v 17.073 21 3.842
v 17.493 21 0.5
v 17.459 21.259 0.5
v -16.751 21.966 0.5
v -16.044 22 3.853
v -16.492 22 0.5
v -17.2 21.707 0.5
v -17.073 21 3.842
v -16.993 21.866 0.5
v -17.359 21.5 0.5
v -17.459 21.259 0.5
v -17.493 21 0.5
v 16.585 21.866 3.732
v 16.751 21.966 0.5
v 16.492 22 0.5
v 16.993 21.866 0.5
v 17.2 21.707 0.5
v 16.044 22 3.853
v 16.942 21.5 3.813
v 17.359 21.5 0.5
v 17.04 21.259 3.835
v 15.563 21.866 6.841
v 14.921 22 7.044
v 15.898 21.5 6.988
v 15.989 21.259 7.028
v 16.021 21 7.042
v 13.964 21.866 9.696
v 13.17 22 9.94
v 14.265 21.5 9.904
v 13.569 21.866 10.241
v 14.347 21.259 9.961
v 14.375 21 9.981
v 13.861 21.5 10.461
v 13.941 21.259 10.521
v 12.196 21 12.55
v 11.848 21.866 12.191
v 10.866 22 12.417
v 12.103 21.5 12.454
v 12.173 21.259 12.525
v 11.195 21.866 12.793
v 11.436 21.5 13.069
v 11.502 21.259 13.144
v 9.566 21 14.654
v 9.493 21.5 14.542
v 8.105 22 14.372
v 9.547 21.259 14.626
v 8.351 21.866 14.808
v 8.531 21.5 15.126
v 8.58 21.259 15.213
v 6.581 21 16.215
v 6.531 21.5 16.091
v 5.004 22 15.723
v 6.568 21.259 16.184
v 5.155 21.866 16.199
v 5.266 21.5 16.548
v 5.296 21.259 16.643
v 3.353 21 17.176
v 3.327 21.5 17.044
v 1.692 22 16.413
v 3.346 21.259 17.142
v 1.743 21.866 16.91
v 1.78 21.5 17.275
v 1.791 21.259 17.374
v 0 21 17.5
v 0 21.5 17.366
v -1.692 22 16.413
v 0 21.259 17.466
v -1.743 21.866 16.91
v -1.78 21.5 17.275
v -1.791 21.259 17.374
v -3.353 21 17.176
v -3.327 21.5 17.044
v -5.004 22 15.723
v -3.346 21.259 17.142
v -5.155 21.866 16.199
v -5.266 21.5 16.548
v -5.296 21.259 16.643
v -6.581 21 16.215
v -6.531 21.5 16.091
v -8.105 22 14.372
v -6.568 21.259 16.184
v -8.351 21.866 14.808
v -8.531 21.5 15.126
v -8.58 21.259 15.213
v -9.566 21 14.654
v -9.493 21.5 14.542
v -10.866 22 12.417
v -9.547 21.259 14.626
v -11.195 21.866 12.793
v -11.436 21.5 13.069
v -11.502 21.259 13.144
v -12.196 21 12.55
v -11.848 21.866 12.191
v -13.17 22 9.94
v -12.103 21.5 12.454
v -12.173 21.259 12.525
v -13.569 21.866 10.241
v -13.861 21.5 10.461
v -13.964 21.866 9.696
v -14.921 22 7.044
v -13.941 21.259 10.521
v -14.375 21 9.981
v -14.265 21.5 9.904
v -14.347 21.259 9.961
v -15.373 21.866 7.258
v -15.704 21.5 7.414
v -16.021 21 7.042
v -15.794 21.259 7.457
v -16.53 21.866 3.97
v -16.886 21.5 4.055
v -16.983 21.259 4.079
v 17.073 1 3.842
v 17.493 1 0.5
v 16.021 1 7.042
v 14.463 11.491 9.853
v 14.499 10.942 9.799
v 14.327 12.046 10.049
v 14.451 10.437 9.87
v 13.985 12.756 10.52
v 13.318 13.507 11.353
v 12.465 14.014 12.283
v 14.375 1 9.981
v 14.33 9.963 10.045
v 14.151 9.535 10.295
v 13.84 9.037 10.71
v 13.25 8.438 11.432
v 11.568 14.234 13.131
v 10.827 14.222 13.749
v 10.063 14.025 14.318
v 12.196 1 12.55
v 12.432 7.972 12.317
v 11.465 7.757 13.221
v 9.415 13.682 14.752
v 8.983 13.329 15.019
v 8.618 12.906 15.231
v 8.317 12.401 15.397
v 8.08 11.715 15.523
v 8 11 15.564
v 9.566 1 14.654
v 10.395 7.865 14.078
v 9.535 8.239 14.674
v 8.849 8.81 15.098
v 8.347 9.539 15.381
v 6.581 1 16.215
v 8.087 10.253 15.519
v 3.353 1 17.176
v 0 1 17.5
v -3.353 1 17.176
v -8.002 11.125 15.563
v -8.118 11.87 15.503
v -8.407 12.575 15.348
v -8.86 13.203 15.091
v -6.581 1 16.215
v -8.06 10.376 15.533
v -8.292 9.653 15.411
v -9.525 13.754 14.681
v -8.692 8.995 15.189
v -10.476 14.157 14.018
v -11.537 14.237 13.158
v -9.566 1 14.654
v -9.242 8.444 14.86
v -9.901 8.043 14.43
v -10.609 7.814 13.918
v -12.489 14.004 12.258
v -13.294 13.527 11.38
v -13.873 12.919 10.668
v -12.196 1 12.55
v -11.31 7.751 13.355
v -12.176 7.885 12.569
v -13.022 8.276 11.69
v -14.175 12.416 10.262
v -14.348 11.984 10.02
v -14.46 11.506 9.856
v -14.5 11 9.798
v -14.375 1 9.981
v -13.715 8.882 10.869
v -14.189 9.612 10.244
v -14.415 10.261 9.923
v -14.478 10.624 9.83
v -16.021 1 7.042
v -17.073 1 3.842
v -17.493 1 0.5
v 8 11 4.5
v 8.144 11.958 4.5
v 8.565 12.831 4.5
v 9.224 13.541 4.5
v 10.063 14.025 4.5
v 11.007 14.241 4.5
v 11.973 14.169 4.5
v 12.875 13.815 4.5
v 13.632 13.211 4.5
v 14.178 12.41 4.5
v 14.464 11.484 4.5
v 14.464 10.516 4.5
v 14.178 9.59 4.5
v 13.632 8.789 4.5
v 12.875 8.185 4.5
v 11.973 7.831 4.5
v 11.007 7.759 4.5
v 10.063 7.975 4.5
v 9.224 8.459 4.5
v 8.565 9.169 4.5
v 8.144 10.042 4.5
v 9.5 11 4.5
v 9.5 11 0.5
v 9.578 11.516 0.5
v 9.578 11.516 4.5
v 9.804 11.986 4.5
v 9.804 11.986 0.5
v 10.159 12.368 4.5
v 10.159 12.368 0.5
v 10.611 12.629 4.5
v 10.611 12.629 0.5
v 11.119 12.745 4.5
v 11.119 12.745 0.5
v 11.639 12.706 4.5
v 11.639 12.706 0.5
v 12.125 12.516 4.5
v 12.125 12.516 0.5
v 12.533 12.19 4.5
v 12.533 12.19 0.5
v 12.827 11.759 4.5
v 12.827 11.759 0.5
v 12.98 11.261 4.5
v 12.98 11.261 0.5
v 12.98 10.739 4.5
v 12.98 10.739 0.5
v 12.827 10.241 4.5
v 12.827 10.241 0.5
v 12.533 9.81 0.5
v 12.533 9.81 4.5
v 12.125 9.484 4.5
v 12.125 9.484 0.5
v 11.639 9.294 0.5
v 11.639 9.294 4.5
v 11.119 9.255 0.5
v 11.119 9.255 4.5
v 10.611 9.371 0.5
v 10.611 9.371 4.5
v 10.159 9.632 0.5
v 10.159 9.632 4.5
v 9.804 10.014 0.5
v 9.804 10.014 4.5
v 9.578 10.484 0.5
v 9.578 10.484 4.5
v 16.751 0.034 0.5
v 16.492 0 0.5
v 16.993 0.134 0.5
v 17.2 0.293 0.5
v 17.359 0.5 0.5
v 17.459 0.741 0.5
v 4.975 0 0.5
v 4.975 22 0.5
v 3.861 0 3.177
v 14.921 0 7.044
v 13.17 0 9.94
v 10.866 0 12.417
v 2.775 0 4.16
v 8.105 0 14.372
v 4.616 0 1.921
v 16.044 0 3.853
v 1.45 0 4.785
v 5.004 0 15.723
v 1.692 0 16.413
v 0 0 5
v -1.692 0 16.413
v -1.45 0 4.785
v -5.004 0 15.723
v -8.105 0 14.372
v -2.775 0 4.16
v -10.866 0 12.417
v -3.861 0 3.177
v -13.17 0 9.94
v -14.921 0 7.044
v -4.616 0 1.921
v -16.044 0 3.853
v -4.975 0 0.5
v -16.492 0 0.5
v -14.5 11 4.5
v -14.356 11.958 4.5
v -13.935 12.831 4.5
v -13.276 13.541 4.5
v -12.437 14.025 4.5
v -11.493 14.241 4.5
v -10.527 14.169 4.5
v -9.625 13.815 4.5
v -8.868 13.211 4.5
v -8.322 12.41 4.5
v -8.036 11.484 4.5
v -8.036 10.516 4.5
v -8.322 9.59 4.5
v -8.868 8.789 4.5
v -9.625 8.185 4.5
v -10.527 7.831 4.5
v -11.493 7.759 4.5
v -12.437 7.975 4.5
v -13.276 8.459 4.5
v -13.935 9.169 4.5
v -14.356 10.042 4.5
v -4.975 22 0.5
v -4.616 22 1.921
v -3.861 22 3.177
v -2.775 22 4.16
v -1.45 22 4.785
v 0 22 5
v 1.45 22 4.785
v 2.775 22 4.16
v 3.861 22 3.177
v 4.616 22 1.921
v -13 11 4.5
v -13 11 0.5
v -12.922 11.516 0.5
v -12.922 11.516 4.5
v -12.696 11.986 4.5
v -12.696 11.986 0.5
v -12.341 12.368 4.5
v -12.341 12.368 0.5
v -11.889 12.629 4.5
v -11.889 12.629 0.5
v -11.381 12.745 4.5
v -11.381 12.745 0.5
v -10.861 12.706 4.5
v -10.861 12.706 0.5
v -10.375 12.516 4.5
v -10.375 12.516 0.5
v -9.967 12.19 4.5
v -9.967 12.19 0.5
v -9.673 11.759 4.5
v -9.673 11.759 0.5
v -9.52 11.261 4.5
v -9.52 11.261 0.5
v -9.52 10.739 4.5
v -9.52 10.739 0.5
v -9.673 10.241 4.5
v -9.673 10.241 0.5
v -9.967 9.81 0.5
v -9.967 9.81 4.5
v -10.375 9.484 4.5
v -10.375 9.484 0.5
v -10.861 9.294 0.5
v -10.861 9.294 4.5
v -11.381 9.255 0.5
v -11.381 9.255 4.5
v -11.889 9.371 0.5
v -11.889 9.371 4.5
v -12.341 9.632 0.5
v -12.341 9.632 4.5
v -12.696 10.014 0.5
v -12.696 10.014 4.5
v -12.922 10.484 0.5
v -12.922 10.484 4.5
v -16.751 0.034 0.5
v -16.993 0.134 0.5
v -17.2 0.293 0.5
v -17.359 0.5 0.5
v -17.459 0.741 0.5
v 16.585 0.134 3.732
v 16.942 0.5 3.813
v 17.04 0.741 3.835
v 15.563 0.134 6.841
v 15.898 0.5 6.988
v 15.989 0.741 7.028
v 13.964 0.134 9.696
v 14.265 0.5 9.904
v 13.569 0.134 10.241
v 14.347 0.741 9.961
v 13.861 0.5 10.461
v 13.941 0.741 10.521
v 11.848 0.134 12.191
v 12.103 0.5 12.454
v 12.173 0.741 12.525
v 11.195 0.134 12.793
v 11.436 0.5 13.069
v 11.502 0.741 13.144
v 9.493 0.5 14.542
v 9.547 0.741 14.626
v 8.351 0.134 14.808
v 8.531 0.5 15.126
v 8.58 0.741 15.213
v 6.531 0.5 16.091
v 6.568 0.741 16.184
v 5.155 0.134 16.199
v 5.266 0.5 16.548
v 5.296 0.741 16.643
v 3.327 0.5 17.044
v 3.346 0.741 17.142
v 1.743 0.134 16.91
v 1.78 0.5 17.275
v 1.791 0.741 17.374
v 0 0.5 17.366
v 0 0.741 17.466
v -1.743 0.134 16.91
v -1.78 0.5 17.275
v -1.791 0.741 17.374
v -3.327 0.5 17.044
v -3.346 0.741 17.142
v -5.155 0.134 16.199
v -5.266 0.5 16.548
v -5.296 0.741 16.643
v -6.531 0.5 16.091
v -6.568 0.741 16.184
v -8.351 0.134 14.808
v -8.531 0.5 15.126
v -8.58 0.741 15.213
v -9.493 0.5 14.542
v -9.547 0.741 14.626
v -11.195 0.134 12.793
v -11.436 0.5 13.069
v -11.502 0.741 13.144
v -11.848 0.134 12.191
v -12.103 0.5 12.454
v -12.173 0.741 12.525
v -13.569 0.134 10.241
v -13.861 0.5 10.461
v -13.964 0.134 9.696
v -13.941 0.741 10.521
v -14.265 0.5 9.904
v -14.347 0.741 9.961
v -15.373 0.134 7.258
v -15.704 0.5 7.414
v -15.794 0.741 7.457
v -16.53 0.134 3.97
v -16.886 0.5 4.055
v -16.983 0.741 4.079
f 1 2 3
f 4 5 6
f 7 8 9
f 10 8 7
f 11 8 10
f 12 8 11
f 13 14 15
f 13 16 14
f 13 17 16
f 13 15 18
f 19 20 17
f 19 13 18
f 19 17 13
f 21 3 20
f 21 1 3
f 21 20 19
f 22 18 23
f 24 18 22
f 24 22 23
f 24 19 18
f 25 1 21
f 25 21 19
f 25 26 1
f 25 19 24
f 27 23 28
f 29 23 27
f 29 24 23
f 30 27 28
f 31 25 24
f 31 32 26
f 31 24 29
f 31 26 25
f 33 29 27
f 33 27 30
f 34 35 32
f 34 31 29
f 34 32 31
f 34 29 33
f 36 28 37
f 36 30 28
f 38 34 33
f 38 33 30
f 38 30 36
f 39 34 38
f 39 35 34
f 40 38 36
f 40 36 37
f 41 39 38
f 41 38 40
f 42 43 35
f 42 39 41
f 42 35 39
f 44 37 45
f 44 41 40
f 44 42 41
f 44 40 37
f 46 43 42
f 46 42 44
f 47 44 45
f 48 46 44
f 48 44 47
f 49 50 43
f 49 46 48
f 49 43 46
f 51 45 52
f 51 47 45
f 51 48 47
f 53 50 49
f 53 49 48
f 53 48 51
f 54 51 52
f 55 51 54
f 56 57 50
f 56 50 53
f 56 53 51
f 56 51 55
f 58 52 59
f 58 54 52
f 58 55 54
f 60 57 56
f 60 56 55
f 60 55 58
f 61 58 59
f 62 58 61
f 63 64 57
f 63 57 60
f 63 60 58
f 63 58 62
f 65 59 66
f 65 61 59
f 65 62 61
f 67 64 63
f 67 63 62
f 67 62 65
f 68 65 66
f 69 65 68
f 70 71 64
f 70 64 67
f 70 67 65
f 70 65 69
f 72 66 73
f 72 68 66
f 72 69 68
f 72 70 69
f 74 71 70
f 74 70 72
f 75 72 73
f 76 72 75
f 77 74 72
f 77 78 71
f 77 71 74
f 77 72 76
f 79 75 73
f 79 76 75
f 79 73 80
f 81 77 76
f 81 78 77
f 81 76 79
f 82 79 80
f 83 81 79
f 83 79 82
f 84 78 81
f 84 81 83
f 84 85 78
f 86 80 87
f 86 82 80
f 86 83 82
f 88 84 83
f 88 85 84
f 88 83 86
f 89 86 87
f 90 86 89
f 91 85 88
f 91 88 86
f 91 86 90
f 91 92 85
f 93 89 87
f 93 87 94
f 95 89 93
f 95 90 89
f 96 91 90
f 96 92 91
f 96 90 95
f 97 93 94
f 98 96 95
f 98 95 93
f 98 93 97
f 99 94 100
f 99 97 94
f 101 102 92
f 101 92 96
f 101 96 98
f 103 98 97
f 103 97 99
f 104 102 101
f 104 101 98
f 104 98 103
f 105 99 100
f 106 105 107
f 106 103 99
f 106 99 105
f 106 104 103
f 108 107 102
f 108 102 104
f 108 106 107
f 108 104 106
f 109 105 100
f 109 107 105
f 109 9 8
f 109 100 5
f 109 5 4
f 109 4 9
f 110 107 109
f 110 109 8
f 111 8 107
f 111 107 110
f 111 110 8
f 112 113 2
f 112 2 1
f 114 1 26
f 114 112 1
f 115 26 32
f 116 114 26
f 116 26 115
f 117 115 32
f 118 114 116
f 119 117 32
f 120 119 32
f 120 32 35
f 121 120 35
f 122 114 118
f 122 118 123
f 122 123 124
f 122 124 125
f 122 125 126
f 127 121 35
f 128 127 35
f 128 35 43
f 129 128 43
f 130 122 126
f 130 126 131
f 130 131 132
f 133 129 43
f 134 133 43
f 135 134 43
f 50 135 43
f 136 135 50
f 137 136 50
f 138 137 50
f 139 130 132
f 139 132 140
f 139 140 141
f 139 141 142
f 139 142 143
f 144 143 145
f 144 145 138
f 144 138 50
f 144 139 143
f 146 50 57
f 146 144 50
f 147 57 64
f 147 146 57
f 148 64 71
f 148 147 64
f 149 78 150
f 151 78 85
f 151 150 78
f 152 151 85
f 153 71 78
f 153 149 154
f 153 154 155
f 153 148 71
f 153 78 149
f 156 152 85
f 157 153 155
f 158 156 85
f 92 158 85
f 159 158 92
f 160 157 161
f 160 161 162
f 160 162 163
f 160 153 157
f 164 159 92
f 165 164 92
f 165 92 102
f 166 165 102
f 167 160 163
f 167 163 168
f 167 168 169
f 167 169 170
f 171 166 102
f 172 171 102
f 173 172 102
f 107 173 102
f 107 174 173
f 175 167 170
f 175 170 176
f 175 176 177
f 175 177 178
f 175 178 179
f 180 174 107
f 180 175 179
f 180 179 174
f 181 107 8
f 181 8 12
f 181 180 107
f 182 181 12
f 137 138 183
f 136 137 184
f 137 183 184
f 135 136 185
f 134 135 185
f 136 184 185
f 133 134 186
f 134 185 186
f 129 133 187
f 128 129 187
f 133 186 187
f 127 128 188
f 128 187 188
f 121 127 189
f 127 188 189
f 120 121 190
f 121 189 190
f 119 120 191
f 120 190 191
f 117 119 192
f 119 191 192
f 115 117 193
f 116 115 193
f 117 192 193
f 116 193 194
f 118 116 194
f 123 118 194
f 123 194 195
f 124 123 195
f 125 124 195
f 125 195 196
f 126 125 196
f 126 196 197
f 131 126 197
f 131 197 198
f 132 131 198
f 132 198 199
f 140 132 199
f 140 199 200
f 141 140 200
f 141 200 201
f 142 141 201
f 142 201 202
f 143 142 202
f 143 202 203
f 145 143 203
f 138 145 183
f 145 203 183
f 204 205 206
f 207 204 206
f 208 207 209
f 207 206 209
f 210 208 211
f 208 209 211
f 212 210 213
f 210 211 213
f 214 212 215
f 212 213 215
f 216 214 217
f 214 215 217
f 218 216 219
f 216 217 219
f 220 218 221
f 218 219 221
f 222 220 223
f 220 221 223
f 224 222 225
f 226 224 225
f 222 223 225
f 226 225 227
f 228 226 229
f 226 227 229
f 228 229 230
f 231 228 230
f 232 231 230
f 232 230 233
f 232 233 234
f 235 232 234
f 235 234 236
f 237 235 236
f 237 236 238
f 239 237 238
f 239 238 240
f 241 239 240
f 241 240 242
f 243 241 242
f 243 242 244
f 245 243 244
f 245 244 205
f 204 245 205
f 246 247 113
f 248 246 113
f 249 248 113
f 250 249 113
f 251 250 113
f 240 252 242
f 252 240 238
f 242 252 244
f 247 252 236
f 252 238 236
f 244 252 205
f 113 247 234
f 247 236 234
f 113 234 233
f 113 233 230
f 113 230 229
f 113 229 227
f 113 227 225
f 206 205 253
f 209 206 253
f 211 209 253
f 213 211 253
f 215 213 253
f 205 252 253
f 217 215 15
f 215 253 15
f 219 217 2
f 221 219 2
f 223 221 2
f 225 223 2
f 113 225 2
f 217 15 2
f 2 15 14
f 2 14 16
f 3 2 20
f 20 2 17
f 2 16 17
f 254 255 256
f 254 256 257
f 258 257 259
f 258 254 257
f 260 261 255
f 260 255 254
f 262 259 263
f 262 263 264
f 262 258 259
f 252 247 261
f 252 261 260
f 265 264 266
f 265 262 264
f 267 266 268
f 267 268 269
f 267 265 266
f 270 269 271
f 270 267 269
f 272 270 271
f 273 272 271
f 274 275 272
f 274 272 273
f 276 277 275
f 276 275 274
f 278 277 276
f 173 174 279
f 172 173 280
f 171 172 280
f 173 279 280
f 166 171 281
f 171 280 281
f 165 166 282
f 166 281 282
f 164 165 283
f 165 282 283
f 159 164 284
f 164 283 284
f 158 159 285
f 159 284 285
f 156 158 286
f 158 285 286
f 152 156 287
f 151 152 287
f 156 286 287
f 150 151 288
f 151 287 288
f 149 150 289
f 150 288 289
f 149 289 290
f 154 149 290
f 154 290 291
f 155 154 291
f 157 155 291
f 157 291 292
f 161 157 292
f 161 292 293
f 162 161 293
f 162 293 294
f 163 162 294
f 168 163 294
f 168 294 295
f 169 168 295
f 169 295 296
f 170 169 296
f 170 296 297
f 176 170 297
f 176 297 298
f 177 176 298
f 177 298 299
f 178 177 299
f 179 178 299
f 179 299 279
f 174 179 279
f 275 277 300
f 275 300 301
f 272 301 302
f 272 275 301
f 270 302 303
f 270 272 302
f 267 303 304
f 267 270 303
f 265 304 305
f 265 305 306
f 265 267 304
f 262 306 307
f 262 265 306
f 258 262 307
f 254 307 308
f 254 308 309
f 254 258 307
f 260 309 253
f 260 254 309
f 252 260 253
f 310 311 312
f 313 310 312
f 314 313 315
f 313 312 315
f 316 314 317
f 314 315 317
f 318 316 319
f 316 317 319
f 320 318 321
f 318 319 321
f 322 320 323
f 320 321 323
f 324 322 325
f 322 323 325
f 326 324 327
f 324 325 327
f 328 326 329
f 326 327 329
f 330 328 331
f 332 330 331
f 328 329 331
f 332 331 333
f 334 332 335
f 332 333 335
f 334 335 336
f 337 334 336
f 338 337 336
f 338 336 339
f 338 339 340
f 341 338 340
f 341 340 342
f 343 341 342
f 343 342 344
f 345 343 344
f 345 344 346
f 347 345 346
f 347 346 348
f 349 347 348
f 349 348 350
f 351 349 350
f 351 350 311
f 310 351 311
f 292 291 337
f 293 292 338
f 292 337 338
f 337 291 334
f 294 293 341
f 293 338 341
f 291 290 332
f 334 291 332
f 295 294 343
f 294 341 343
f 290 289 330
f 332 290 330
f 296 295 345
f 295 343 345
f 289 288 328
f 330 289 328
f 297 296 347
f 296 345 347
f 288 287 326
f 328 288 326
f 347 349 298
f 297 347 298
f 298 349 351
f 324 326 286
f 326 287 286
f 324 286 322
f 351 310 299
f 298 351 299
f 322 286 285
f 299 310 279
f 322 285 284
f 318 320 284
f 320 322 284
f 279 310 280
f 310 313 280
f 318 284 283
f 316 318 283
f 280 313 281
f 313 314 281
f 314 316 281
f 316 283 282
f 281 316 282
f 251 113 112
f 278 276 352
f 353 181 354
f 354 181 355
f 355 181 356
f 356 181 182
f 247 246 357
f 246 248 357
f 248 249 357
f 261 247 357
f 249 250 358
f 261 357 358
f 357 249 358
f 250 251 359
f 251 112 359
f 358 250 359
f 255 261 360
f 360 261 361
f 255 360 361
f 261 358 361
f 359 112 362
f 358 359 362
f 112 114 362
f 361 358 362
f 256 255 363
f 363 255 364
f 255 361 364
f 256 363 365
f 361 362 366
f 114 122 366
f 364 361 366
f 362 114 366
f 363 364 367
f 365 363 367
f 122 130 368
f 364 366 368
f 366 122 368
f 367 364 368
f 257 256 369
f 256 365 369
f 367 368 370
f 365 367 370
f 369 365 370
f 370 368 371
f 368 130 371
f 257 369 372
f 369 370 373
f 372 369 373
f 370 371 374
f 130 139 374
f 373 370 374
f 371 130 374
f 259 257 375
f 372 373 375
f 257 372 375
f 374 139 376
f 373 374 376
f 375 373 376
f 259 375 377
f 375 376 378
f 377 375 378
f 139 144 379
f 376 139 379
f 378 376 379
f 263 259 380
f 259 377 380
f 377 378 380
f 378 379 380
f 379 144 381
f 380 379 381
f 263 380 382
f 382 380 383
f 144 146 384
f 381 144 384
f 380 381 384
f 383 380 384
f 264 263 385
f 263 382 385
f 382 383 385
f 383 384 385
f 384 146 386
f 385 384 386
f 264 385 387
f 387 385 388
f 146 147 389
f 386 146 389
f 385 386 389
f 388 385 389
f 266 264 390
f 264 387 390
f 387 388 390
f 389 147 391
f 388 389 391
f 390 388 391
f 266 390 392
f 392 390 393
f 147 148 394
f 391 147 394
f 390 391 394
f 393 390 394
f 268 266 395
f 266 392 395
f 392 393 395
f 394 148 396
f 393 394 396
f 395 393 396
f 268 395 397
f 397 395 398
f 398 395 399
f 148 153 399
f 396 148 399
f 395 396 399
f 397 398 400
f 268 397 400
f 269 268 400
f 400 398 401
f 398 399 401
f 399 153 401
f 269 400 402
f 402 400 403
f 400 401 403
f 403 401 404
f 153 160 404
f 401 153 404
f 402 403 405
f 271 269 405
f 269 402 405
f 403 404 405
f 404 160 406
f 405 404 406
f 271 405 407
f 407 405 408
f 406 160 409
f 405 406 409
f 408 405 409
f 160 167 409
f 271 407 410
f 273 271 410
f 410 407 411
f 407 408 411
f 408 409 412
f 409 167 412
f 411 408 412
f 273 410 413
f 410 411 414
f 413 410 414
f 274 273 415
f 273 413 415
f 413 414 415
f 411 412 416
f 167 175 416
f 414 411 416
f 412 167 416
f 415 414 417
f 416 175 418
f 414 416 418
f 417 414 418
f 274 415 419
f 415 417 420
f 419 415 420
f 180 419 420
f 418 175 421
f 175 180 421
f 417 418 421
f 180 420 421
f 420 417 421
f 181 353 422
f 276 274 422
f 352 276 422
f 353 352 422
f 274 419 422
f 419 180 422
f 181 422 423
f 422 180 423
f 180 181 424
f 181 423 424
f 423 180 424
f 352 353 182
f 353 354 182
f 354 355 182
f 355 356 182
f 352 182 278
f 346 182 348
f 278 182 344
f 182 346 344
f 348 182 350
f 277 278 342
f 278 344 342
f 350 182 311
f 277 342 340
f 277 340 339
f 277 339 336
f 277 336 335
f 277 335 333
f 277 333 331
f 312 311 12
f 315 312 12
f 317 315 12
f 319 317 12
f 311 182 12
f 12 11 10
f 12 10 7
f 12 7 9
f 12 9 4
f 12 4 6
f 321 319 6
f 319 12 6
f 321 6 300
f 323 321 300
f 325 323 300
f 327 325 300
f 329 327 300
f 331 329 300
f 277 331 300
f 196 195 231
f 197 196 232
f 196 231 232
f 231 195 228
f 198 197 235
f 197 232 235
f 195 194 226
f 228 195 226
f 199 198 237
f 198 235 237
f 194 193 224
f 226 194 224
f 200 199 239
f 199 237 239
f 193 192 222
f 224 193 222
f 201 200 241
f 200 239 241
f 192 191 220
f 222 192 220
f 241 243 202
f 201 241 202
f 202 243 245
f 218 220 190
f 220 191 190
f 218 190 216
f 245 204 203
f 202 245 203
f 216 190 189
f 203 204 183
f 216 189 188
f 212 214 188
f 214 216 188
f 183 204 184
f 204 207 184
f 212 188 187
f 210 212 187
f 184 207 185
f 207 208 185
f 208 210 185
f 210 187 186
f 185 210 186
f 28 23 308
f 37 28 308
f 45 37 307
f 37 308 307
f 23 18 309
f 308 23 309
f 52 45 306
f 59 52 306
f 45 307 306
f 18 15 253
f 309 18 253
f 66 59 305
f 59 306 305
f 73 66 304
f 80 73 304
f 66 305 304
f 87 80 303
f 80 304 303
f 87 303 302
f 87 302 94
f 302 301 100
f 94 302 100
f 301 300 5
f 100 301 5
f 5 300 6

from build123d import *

# Parameters (mm, degrees)
BOSS_EXTRUDE1_DEPTH = 22
SKETCH3_R           = 1.75
CUT_EXTRUDE1_DEPTH  = 22
SKETCH4_R           = 3.25
CUT_EXTRUDE2_DEPTH  = 22
FILLET1_R           = 1
SKETCH5_W           = 36.583479506
SKETCH5_H           = 0.5
CUT_EXTRUDE3_DEPTH  = 39


with BuildPart() as part:
    # Sketch2 → Boss-Extrude1 (new body)
    with BuildSketch(Plane(origin=(0, 0, 0), x_dir=(1, 0, 0), z_dir=(0, 1, 0))):
        with BuildLine():
            Line((5, 0), (17.5, 0))
            ThreePointArc((17.5, 0), (0, -17.5), (-17.5, 0))
            Line((-17.5, 0), (-5, 0))
            ThreePointArc((-5, 0), (0, -5), (5, 0))
        make_face()
    extrude(amount=BOSS_EXTRUDE1_DEPTH)

    # Sketch3 → Cut-Extrude1 (cut)
    with BuildSketch(Plane(origin=(0, 0, 0), x_dir=(-1, 0, 0), z_dir=(0, 0, -1))):
        with Locations((11.25, 11)):
            Circle(SKETCH3_R)
        with Locations((-11.25, 11)):
            Circle(SKETCH3_R)
    extrude(amount=-CUT_EXTRUDE1_DEPTH, mode=Mode.SUBTRACT)

    # Sketch4 → Cut-Extrude2 (cut)
    with BuildSketch(Plane(origin=(0, 0, 4.5), x_dir=(-1, 0, 0), z_dir=(0, 0, -1))):
        with Locations((-11.25, 11)):
            Circle(SKETCH4_R)
        with Locations((11.25, 11)):
            Circle(SKETCH4_R)
    extrude(amount=-CUT_EXTRUDE2_DEPTH, mode=Mode.SUBTRACT)

    # Fillet1
    fillet1_edges = [part.edges().sort_by_distance(p)[0] for p in [
        (0, 22, 17.5),
        (0, 0, 17.5),
    ]]
    fillet(fillet1_edges, radius=FILLET1_R)

    # Sketch5 → Cut-Extrude3 (cut)
    with BuildSketch(Plane(origin=(0, 22, 0), x_dir=(1, 0, 0), z_dir=(0, 1, 0))):
        with Locations((-0.146844137, -0.25)):
            Rectangle(SKETCH5_W, SKETCH5_H)
    extrude(amount=-CUT_EXTRUDE3_DEPTH, mode=Mode.SUBTRACT)


solid = part.part
